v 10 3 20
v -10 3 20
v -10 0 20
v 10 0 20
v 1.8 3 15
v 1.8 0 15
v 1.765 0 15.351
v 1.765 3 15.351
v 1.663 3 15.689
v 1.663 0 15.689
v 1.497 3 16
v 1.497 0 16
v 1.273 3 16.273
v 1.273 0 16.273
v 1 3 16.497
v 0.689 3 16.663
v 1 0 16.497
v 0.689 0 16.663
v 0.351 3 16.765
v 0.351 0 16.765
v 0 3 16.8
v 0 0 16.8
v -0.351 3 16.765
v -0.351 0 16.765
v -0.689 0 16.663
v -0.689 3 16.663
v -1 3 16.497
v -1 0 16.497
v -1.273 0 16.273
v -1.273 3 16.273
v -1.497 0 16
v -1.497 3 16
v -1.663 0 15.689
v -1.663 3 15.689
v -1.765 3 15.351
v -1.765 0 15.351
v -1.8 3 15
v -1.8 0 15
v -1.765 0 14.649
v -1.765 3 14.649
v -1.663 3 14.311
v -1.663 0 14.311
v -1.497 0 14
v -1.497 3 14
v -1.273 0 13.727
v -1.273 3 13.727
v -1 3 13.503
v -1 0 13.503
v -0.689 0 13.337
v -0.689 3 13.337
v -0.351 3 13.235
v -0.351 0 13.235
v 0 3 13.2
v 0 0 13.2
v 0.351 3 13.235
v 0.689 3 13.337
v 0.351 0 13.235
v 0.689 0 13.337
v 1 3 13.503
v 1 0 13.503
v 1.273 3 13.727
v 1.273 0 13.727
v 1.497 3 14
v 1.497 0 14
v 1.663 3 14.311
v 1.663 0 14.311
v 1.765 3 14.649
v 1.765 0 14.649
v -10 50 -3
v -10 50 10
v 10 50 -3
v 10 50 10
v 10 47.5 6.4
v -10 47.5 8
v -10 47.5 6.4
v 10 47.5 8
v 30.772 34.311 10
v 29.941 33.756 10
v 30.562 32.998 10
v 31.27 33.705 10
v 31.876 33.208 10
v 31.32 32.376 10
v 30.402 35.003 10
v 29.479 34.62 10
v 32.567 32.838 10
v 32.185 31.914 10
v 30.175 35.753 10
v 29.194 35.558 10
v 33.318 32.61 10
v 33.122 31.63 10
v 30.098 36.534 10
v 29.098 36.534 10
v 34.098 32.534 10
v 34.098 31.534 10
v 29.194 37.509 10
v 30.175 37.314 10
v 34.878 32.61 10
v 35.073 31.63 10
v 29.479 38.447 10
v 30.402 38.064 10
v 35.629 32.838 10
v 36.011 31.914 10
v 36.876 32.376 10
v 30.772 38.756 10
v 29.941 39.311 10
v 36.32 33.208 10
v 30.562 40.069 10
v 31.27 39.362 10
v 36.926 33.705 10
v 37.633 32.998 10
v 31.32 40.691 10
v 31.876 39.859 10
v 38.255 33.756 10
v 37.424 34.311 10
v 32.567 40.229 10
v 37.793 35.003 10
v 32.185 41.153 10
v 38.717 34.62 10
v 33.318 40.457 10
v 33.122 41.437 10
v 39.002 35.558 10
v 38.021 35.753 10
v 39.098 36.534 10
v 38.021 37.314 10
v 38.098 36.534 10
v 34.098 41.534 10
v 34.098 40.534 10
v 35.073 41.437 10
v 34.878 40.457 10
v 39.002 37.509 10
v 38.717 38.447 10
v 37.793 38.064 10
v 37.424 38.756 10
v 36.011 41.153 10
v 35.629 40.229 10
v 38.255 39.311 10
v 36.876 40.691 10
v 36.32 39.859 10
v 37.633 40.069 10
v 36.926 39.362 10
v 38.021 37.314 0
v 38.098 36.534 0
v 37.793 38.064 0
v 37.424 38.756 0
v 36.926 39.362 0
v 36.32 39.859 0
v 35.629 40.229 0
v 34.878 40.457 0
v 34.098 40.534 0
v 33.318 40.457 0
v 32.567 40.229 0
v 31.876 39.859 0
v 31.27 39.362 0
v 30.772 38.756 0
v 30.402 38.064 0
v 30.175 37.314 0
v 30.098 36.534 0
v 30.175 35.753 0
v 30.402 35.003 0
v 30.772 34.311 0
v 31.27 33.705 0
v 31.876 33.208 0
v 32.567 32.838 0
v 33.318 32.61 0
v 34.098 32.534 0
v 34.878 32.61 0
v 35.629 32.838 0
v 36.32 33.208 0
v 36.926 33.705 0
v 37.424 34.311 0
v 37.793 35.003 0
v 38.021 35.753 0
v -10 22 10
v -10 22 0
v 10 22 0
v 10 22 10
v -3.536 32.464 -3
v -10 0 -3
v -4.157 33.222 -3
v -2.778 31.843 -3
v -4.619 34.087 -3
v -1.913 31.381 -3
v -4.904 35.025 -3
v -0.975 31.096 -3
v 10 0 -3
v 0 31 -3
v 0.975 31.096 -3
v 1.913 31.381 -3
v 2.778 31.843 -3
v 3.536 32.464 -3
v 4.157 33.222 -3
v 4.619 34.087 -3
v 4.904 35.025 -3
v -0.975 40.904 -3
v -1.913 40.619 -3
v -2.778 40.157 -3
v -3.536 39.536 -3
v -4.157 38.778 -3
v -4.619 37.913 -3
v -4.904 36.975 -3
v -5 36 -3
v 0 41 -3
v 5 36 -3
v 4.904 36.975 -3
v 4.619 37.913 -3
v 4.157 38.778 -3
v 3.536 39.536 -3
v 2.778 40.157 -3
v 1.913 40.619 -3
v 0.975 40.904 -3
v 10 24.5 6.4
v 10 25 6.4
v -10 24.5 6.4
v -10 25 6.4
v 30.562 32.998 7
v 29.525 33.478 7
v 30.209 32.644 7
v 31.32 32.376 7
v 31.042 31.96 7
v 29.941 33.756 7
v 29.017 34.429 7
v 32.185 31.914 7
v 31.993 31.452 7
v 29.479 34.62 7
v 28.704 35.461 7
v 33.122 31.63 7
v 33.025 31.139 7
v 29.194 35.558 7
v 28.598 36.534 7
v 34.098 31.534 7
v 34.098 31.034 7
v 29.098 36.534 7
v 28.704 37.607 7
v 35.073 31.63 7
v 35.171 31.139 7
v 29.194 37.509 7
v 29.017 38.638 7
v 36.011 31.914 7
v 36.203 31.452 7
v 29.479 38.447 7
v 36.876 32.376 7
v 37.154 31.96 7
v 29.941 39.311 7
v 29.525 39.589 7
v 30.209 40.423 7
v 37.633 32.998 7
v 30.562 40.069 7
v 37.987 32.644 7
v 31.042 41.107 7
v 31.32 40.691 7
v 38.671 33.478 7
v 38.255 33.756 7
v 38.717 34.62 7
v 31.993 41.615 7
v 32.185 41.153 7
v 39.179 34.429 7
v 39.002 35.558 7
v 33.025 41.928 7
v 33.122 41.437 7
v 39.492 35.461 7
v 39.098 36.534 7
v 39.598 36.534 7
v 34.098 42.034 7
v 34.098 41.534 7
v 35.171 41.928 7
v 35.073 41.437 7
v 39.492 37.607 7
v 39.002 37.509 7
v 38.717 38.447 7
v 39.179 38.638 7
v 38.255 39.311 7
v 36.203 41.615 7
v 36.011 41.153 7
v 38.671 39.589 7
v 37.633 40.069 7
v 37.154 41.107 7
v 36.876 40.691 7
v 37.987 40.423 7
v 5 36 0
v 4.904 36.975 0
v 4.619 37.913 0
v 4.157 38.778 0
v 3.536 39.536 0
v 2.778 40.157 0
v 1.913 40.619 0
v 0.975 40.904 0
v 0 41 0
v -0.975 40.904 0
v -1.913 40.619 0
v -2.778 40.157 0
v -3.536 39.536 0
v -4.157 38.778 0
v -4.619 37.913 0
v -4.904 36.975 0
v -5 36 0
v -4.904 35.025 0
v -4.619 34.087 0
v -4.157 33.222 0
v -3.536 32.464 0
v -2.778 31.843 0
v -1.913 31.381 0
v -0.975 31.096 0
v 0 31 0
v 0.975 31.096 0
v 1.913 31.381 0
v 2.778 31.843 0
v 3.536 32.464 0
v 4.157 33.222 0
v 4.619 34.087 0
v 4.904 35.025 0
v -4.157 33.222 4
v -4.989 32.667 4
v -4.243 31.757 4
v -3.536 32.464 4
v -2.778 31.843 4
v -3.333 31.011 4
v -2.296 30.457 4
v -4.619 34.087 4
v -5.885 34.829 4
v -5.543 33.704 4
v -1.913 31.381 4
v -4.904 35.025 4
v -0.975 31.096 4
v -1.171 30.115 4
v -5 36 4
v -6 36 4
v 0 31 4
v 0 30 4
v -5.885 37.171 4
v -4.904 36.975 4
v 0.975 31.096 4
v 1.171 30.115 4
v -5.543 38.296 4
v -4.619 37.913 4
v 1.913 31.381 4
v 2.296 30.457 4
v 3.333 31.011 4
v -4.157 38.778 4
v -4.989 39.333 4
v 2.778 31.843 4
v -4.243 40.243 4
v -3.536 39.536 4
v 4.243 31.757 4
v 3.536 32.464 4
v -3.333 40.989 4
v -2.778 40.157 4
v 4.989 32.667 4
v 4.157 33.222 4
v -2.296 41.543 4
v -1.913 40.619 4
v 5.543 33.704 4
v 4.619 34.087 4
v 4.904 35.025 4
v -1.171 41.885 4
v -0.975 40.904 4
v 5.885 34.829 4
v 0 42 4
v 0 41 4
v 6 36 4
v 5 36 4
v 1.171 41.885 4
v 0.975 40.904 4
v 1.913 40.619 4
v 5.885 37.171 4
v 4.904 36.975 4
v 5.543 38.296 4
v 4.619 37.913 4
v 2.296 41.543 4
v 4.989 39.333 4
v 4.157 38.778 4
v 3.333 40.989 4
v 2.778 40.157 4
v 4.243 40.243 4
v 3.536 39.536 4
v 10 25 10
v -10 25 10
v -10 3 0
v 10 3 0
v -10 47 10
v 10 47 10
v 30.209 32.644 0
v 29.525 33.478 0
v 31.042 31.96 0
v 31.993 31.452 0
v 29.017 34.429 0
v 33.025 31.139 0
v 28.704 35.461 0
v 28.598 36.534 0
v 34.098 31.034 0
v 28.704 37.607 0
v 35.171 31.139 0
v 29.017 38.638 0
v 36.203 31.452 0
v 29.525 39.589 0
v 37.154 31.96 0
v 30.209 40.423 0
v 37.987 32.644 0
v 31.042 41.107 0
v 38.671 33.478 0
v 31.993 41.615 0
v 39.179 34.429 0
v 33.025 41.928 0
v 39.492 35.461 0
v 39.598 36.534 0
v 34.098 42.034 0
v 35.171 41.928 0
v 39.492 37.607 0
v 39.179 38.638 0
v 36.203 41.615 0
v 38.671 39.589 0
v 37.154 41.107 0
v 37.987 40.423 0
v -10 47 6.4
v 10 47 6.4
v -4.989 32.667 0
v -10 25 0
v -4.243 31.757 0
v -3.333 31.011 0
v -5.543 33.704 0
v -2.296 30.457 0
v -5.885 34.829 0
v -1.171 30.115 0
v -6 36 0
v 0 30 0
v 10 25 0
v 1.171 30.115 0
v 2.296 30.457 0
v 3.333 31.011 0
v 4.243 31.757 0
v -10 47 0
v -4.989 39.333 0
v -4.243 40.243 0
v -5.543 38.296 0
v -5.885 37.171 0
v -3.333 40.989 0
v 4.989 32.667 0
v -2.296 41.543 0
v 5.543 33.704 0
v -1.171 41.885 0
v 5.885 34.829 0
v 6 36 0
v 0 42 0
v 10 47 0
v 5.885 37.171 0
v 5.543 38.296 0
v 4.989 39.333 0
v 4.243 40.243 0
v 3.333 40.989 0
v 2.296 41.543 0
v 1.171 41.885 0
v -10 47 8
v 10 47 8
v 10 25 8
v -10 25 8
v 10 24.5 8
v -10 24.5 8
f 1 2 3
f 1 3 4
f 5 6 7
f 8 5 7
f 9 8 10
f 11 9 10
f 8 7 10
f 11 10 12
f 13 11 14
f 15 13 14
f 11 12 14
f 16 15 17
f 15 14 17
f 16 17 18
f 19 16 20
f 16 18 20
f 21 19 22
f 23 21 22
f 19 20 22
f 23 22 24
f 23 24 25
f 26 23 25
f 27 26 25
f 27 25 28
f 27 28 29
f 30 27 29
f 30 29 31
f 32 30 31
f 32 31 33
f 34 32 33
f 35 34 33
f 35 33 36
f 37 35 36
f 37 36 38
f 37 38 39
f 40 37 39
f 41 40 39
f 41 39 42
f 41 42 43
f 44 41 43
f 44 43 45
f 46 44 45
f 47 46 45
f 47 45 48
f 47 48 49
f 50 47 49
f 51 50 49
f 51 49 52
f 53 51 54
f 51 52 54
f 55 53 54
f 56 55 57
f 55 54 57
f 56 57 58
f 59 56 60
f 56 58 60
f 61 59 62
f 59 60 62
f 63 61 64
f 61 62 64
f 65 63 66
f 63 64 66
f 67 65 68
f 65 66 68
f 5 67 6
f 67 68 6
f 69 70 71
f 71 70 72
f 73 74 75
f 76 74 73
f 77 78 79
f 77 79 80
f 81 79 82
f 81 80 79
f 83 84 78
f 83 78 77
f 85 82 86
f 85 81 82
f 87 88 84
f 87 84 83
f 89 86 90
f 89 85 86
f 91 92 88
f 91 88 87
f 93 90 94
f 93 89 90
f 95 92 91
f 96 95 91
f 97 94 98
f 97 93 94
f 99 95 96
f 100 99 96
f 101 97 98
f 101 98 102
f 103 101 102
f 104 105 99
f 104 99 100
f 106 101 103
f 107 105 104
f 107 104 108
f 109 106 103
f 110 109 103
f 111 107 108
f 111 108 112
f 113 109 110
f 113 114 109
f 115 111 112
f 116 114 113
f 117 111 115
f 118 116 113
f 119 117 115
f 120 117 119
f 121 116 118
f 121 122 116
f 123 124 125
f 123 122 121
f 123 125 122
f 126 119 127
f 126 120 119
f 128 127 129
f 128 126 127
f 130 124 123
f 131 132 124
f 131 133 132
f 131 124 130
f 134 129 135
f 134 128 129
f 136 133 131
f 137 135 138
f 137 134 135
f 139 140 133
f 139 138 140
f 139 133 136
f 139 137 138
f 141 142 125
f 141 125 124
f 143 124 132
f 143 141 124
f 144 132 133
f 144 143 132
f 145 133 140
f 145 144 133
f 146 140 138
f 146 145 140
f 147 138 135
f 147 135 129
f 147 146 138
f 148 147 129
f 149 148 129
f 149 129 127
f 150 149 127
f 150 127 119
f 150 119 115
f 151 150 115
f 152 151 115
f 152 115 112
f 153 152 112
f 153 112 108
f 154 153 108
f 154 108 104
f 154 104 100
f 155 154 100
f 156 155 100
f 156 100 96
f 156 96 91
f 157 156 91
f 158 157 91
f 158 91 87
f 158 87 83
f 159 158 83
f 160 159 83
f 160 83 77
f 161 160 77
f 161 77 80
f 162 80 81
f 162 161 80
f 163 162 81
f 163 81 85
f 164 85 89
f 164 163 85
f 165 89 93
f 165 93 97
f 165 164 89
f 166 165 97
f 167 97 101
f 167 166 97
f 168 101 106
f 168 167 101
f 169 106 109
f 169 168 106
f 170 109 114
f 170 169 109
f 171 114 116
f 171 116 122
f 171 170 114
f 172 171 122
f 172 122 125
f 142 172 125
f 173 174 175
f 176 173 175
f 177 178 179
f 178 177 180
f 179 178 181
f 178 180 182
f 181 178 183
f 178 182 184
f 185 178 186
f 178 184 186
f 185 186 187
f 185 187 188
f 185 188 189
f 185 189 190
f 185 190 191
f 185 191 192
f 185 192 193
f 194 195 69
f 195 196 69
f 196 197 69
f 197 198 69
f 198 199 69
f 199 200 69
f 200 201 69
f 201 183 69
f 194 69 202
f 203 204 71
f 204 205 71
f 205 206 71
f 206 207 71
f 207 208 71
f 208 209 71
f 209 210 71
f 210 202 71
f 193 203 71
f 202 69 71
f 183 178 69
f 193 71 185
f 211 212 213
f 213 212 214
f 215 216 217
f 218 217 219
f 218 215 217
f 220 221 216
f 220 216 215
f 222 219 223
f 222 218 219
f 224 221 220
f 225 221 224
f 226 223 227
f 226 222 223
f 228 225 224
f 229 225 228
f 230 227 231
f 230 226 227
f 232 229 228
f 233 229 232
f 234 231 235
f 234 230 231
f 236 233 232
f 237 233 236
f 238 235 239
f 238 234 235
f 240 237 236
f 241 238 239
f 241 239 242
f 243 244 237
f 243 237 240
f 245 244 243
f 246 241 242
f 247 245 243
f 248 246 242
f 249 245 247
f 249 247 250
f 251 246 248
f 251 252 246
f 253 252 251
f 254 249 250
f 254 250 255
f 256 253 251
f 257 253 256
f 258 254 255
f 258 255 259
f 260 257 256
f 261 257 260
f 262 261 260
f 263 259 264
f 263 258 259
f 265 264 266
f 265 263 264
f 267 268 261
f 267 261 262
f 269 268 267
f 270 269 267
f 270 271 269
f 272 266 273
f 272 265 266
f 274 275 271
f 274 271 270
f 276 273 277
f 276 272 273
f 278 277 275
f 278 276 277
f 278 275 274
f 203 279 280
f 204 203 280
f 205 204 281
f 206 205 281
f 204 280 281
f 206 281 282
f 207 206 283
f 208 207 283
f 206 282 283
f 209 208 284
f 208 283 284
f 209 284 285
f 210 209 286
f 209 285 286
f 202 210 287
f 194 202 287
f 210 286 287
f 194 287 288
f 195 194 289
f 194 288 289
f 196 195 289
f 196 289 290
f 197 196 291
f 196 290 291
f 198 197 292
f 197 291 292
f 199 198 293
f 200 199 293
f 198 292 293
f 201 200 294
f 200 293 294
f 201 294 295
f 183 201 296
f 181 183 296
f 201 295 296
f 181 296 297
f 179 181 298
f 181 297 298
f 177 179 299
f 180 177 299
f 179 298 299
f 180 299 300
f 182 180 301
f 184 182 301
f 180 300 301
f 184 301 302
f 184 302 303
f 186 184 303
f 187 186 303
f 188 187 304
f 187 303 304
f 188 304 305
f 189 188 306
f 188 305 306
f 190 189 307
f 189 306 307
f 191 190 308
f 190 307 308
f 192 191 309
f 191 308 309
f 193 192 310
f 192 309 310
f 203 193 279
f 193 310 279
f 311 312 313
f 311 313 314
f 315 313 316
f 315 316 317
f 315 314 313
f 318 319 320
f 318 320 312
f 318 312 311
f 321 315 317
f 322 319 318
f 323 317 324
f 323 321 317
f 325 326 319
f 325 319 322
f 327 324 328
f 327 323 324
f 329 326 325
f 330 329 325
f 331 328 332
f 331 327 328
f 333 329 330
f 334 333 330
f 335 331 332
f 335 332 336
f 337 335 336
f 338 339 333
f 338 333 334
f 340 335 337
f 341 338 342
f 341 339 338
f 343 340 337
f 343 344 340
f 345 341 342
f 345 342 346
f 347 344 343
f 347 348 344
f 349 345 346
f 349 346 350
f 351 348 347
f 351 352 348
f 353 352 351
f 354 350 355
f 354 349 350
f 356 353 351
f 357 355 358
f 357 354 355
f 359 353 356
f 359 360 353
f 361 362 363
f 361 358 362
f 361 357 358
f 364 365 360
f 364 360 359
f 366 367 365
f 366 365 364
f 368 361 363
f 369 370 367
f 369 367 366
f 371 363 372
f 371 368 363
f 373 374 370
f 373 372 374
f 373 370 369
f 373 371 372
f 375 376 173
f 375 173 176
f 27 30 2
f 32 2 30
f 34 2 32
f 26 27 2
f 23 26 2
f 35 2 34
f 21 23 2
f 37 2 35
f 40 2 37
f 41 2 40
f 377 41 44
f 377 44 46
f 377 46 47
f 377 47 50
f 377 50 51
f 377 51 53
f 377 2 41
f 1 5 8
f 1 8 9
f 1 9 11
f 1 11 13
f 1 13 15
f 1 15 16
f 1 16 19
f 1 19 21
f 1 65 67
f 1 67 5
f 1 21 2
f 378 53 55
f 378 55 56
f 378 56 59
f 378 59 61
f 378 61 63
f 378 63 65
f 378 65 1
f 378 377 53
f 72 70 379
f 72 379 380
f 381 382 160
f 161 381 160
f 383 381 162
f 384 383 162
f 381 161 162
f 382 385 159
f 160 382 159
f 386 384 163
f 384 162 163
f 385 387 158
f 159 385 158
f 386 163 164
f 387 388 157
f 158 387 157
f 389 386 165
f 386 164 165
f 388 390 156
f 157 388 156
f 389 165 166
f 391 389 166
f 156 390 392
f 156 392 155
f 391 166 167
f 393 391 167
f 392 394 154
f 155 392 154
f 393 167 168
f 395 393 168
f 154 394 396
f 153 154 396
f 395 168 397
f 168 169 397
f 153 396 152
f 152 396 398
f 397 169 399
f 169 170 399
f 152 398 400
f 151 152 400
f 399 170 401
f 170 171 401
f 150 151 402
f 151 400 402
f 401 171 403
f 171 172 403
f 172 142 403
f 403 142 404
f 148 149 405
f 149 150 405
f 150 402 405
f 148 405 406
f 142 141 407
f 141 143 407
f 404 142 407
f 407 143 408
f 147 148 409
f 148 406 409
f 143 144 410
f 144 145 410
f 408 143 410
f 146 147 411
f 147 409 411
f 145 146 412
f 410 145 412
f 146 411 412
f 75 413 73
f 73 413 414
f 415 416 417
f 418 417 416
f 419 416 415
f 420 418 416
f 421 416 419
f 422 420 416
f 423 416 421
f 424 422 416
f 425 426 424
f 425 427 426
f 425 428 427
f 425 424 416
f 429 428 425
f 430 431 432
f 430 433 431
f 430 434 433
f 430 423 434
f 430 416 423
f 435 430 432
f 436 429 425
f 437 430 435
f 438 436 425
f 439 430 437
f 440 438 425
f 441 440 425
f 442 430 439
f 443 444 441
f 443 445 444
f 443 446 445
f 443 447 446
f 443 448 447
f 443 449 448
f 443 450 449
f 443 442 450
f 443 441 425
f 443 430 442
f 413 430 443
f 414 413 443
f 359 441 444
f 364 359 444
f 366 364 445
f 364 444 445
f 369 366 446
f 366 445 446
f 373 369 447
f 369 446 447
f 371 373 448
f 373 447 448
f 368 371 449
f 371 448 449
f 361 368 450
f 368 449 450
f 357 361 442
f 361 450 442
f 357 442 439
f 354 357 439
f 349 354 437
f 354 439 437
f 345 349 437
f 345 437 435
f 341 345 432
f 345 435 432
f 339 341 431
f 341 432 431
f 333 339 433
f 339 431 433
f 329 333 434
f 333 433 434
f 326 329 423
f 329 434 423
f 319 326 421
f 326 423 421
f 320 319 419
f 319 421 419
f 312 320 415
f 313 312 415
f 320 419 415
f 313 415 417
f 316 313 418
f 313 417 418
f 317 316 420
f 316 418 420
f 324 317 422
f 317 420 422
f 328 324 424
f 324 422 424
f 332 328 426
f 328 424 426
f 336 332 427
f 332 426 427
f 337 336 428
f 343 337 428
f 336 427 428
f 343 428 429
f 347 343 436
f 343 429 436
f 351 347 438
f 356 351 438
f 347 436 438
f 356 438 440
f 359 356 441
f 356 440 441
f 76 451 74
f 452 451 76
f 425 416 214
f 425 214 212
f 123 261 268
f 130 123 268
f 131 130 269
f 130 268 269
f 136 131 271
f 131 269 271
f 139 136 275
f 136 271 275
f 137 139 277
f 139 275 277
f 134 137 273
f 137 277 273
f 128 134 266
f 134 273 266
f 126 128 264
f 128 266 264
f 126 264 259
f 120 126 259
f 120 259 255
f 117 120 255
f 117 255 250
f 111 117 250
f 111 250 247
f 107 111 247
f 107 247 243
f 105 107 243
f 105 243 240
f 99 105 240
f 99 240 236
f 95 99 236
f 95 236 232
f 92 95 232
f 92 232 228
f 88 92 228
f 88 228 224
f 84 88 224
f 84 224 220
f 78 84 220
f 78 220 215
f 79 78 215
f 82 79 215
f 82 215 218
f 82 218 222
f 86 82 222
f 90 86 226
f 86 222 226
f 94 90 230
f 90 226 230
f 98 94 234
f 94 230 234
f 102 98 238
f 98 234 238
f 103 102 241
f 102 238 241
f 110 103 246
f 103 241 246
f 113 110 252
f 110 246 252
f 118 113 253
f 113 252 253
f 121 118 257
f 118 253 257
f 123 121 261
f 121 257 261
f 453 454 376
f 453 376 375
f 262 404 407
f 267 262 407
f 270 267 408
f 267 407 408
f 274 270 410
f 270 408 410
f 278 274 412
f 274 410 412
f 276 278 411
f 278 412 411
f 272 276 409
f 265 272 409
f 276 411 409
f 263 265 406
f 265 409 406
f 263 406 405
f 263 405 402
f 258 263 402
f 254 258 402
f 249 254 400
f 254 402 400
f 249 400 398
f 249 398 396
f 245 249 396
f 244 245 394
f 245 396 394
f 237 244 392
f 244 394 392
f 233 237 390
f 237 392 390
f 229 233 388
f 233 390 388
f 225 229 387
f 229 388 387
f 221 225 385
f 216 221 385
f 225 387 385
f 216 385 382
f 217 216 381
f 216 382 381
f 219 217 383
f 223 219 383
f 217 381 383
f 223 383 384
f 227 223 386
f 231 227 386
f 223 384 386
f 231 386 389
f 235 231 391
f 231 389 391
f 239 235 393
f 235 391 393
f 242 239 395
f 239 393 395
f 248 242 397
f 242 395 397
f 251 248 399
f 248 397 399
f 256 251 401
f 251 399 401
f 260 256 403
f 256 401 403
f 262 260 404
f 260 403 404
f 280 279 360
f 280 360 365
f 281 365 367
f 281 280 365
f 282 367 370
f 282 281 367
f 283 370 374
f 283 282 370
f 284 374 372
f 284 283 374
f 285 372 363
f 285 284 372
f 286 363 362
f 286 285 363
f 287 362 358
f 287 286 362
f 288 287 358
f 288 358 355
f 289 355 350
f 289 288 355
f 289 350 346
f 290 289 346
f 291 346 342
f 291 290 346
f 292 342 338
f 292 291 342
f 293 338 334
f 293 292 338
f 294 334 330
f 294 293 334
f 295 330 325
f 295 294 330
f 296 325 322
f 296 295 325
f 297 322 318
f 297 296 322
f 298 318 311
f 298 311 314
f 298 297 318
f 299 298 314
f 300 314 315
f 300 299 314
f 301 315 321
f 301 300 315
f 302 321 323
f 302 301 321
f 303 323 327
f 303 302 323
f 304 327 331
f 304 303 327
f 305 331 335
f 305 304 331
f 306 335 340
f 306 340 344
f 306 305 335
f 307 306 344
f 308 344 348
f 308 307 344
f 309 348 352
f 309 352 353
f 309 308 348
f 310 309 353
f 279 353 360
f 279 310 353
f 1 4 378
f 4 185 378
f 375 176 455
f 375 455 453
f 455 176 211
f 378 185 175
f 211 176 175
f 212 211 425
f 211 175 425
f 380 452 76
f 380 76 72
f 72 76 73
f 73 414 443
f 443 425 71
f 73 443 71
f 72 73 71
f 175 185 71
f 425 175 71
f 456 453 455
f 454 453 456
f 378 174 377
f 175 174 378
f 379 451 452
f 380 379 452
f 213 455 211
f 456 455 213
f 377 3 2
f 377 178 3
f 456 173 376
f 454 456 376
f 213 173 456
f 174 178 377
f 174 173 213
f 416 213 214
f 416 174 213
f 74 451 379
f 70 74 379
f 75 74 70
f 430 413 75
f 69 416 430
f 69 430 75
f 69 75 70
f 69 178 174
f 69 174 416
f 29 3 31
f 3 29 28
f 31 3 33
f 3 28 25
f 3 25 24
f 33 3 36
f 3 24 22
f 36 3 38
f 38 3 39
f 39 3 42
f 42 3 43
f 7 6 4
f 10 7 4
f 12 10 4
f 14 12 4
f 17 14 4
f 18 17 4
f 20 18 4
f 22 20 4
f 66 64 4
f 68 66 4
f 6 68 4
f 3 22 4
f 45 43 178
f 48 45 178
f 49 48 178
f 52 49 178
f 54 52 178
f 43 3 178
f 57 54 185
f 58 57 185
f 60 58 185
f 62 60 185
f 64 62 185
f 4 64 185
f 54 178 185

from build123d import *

# Parameters (mm, degrees)
F0_W      = 20
F0_H      = 3
F1_DEPTH  = 10
F0_R      = 6
F0_R_2    = 5
F2_DEPTH  = 4
F0_H_2    = 22
F0_H_3    = 19
F3_DEPTH  = 3
F4_W      = 20
F4_H      = 1.6
F5_DEPTH  = 0.5
F6_W      = 20
F6_H      = 1.6
F7_DEPTH  = 0.5
F8_DEPTH  = 10
F9_R      = 1.8
F10_DEPTH = 50.001
F11_R     = 5
F11_R_2   = 4
F12_DEPTH = 10
F11_R_3   = 5.5
F15_DEPTH = 7
F16_DEPTH = 10


# Not quite as in the source:
# - a feature names something its author has since deleted; it is built from what else it names
# - the program builds the solid bodies; features that only make, move or delete a surface that nothing else refers to are left out


with BuildPart() as f1:
    # F0 (on Top) → F1 (new body)
    with BuildSketch(Plane.XY):
        with Locations((0, 1.5)):
            Rectangle(F0_W, F0_H)
    extrude(amount=F1_DEPTH)



with BuildPart() as f1b:
    # F0 (on Top) → F1, piece 2 (new body)
    with BuildSketch(Plane.XY):
        with Locations((0, 23.5)):
            Rectangle(F0_W, F0_H)
    extrude(amount=F1_DEPTH)


with BuildPart() as f1c:
    # F0 (on Top) → F1, piece 3 (new body)
    with BuildSketch(Plane.XY):
        with Locations((0, 48.5)):
            Rectangle(F0_W, F0_H)
    extrude(amount=F1_DEPTH)


with BuildPart() as f2:
    # F0 (on Top) → F2 (new body)
    with BuildSketch(Plane.XY):
        with Locations((0, 36)):
            Circle(F0_R)
        with Locations((0, 36)):
            Circle(F0_R_2, mode=Mode.SUBTRACT)
    extrude(amount=F2_DEPTH)


with BuildPart() as f1_1:
    add(f1.part)

    add(f1b.part)  # F3 merges F1b

    add(f1c.part)  # F3 merges F1c

    add(f2.part)  # F3 merges F2
    # F0 (on Top) → F3 (join)
    with BuildSketch(Plane.XY):
        with Locations((0, 48.5)):
            Rectangle(F0_W, F0_H)
        with Locations((0, 36)):
            Rectangle(F0_W, F0_H_2)
        with Locations((0, 36)):
            Circle(F0_R, mode=Mode.SUBTRACT)
        with Locations((0, 36)):
            Circle(F0_R)
        with Locations((0, 36)):
            Circle(F0_R_2, mode=Mode.SUBTRACT)
        with Locations((0, 23.5)):
            Rectangle(F0_W, F0_H)
        with Locations((0, 12.5)):
            Rectangle(F0_W, F0_H_3)
        with Locations((0, 1.5)):
            Rectangle(F0_W, F0_H)
    extrude(amount=-F3_DEPTH)

    # F4 (on face) → F5 (cut)
    with BuildSketch(Plane.XZ.offset(-47)):
        with Locations((0, 7.2)):
            Rectangle(F4_W, F4_H)
    extrude(amount=-F5_DEPTH, mode=Mode.SUBTRACT)

    # F6 (on face) → F7 (cut)
    with BuildSketch(Plane(origin=(0, 25, 0), x_dir=(-1, 0, 0), z_dir=(0, 1, 0))):
        with Locations((0, 7.2)):
            Rectangle(F6_W, F6_H)
    extrude(amount=-F7_DEPTH, mode=Mode.SUBTRACT)

    # F8 (add): a face of the model
    f8_faces = [f1_1.faces().sort_by_distance(p)[0] for p in [
        (0, 1.5, 10),
    ]]
    extrude(f8_faces, amount=F8_DEPTH)

    # F9 (on Front) → F10 (cut, through all)
    with BuildSketch(Plane.XZ):
        with Locations((0, 15)):
            Circle(F9_R)
    extrude(amount=-F10_DEPTH, mode=Mode.SUBTRACT)


with BuildPart() as f12:
    # F11 (on Top) → F12 (new body)
    with BuildSketch(Plane.XY):
        with Locations((34.0979397297, 36.5335047245)):
            Circle(F11_R)
        with Locations((34.0979397297, 36.5335047245)):
            Circle(F11_R_2, mode=Mode.SUBTRACT)
    extrude(amount=F12_DEPTH)


with BuildPart() as f15:
    # F11 (on Top) → F15 (new body)
    with BuildSketch(Plane.XY):
        with Locations((34.0979397297, 36.5335047245)):
            Circle(F11_R_3)
        with Locations((34.0979397297, 36.5335047245)):
            Circle(F11_R, mode=Mode.SUBTRACT)
        with Locations((34.0979397297, 36.5335047245)):
            Circle(F11_R)
        with Locations((34.0979397297, 36.5335047245)):
            Circle(F11_R_2, mode=Mode.SUBTRACT)
    extrude(amount=F15_DEPTH)

    # F11 (on Top) → F16 (join)
    with BuildSketch(Plane.XY):
        with Locations((34.0979397297, 36.5335047245)):
            Circle(F11_R)
        with Locations((34.0979397297, 36.5335047245)):
            Circle(F11_R_2, mode=Mode.SUBTRACT)
    extrude(amount=F16_DEPTH)


solid = Compound([f1_1.part, f15.part])
